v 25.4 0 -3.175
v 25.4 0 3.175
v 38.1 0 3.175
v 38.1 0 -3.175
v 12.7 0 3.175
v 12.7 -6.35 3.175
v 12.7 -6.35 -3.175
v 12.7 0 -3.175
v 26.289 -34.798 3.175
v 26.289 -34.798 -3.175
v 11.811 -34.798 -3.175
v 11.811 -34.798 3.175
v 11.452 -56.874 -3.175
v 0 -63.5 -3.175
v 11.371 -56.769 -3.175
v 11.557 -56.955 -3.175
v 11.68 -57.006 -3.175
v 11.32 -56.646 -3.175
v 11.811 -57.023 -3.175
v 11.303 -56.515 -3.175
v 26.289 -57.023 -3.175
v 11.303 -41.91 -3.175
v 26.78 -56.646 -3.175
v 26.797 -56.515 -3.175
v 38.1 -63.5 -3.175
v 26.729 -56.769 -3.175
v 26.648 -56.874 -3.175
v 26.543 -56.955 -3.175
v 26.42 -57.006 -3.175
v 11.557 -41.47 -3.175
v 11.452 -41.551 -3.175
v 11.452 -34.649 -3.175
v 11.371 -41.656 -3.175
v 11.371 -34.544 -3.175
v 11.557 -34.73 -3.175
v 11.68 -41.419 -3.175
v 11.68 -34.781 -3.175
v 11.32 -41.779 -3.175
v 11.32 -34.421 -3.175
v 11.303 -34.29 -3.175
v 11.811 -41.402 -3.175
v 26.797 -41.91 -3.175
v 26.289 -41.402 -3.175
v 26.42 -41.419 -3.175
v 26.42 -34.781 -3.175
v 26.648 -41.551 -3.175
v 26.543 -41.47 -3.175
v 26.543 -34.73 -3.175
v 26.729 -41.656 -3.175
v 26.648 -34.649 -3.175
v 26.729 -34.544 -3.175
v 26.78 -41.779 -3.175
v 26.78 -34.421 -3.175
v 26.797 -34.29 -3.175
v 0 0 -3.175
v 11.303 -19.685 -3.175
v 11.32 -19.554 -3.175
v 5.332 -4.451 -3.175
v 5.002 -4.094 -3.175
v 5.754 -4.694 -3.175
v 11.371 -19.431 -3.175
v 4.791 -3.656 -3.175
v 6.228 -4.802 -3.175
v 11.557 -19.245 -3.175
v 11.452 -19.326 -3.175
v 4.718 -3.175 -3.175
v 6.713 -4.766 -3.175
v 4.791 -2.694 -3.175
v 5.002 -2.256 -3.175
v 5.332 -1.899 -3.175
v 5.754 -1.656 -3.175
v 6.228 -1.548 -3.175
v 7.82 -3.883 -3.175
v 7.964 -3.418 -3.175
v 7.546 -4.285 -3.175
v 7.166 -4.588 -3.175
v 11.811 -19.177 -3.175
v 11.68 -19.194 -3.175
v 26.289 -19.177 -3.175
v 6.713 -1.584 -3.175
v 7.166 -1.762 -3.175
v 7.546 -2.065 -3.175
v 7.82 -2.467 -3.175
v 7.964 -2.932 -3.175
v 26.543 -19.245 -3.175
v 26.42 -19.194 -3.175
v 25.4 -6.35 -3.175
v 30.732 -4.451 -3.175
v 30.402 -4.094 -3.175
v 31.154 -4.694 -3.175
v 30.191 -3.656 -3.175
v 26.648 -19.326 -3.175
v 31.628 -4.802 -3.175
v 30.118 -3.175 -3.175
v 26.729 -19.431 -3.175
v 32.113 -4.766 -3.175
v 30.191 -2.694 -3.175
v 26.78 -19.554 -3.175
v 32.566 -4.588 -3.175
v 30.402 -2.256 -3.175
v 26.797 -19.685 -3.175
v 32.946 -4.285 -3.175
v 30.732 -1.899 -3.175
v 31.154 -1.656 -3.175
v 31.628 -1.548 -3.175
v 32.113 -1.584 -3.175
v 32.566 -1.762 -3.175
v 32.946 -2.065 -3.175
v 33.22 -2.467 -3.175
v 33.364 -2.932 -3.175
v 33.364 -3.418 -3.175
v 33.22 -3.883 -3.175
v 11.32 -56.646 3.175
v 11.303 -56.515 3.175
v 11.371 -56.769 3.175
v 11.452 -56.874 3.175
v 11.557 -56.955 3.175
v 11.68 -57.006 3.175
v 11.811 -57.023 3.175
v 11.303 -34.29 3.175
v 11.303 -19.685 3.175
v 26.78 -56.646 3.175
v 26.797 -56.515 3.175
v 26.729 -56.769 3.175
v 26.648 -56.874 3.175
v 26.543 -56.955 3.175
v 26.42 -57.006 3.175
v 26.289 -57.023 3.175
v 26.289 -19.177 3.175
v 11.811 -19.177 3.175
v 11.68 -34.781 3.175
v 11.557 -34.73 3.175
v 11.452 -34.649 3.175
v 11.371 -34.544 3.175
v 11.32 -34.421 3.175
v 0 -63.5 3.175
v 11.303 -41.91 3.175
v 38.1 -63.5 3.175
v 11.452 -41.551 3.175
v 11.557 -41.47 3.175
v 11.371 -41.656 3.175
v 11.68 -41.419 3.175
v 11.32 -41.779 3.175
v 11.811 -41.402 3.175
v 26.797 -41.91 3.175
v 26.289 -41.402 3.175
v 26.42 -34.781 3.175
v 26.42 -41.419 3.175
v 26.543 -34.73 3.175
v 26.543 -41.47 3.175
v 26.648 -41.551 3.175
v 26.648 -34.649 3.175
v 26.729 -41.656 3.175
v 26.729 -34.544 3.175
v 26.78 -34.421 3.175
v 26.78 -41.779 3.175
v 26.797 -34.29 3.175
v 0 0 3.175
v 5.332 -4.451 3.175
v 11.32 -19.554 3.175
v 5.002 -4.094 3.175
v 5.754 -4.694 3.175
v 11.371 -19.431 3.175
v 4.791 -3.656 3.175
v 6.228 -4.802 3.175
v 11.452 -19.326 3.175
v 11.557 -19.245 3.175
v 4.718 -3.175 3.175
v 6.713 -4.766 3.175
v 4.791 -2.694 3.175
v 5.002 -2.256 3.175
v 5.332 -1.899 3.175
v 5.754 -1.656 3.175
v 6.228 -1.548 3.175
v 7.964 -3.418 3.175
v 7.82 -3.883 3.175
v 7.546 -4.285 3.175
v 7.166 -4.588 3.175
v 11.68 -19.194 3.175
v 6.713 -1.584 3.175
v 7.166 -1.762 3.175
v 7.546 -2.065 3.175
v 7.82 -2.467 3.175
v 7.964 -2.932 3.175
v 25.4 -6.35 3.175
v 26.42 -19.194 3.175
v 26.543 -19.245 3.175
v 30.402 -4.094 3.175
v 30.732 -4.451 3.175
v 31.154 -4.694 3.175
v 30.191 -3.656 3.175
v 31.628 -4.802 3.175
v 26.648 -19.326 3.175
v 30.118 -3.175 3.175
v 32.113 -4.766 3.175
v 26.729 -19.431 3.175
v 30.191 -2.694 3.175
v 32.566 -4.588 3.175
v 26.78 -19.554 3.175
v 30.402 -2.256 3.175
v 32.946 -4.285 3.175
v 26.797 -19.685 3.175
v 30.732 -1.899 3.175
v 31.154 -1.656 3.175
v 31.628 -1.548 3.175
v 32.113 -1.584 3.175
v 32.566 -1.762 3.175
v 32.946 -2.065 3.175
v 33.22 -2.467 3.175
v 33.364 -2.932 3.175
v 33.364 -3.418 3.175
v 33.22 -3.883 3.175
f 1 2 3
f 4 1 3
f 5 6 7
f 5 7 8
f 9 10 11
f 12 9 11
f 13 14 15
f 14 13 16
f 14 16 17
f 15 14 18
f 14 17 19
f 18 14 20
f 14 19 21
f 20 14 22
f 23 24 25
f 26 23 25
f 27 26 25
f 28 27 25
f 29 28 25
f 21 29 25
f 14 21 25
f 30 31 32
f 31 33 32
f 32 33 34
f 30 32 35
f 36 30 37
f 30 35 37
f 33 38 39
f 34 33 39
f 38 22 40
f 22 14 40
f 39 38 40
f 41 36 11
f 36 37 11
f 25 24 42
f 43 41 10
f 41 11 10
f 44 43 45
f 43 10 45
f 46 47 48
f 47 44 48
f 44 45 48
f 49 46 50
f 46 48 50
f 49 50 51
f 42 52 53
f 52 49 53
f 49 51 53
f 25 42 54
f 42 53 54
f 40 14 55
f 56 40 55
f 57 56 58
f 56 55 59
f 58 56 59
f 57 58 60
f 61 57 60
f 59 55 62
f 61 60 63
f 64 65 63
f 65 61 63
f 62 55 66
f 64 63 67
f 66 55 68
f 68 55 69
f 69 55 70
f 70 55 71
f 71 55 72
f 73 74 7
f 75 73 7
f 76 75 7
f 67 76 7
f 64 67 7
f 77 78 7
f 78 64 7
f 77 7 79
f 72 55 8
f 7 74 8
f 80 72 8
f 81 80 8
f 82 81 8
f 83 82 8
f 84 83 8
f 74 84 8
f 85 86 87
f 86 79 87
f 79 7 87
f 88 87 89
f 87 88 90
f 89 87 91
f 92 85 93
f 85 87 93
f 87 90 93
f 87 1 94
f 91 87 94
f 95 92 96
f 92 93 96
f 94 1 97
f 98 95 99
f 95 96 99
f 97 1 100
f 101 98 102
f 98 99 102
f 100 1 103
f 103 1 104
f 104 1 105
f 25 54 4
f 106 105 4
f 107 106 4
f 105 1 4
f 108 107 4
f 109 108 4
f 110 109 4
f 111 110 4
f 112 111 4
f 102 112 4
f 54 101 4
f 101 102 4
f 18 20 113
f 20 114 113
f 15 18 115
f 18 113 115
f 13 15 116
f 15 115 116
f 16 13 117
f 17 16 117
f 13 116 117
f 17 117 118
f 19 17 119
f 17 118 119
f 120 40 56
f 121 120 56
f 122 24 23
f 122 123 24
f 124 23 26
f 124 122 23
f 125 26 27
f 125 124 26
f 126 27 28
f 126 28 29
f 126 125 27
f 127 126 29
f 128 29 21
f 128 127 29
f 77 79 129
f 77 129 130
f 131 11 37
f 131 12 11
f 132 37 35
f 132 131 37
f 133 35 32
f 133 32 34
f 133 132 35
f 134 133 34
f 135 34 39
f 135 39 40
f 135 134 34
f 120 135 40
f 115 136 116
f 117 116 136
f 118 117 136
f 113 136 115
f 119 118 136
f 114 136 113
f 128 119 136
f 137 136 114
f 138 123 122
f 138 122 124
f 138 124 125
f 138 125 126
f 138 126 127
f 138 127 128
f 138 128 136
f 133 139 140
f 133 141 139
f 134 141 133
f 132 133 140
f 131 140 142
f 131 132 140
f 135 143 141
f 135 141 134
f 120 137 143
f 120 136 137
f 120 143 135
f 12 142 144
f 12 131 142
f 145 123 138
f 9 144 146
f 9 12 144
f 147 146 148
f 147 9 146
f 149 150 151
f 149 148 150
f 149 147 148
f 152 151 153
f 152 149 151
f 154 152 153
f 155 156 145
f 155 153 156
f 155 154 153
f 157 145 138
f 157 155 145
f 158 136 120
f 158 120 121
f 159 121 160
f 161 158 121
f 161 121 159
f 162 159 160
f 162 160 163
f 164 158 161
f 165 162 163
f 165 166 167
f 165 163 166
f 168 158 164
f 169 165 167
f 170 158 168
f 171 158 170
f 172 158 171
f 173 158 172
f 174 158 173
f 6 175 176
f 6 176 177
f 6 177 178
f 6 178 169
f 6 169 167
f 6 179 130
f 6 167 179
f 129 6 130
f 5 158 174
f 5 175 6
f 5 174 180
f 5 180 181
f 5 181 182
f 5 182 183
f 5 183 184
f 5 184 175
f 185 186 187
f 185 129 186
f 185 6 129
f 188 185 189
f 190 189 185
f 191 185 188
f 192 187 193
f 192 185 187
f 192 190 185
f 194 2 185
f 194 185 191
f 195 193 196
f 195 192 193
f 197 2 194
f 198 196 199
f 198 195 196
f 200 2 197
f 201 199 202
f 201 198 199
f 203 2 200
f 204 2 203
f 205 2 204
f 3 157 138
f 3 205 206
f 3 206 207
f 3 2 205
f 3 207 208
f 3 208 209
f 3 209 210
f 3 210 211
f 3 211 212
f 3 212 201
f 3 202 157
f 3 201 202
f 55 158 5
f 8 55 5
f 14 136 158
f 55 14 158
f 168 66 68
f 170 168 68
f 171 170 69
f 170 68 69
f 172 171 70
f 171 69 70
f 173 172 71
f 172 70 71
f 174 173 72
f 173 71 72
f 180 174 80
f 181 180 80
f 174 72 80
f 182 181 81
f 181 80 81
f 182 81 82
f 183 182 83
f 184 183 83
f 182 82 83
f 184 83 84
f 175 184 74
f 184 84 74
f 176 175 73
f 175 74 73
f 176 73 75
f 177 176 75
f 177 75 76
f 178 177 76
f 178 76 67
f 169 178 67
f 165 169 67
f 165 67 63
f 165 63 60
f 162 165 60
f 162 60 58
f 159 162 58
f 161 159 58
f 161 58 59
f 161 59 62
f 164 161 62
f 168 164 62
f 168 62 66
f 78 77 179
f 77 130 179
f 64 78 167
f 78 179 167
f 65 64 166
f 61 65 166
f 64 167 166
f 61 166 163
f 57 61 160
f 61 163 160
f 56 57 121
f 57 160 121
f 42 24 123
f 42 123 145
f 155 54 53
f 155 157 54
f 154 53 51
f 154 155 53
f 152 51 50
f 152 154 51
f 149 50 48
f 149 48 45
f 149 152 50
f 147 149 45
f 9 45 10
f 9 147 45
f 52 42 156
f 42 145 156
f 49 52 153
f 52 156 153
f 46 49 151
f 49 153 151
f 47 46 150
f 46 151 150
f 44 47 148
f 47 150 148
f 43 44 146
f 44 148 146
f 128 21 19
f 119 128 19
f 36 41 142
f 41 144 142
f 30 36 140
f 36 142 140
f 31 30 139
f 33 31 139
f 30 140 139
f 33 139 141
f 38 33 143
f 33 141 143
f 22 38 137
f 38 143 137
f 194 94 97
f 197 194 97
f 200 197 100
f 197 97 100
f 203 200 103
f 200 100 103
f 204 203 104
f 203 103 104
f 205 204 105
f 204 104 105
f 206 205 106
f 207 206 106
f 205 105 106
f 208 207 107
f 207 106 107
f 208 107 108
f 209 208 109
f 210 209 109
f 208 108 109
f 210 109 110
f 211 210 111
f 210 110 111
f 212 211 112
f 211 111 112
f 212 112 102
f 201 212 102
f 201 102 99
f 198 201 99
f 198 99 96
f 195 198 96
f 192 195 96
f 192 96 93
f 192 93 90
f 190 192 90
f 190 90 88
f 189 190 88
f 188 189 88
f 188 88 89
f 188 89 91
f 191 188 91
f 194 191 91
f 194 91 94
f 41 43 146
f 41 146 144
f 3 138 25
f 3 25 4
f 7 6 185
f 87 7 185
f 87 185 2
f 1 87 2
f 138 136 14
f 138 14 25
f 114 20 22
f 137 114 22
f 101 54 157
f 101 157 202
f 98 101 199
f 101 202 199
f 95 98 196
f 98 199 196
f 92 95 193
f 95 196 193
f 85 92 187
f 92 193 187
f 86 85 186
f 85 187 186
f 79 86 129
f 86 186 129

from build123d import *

# Parameters (mm, degrees)
SKETCH1_W             = 38.1
SKETCH1_H             = 63.5
BOSS_EXTRUDE1_DEPTH   = 3.175
F_4_CLEARANCE_HOLE1_D = 3.2639
CUT_EXTRUDE3_REACH    = 76.325
SKETCH6_W             = 12.7
SKETCH6_H             = 6.35
CUT_EXTRUDE4_REACH    = 76.325
SKETCH10_W            = 15.494
SKETCH10_H            = 15.621
LPATTERN1_COUNT       = 2
LPATTERN1_PITCH       = 22.225
FILLET1_R             = 0.508


with BuildPart() as part:
    # Sketch1 → Boss-Extrude1 (new, symmetric)
    with BuildSketch(Plane.XY):
        with Locations((19.05, -31.75)):
            Rectangle(SKETCH1_W, SKETCH1_H)
    extrude(amount=BOSS_EXTRUDE1_DEPTH, both=True)

    # #4 Clearance Hole1 (through all)
    with Locations(Plane.XY.offset(3.175)):
        with Locations((6.35, -3.175), (31.75, -3.175)):
            Hole(F_4_CLEARANCE_HOLE1_D / 2)

    # Sketch6 → Cut-Extrude3 (cut, up to next)
    with BuildSketch(Plane.XY.offset(3.175), mode=Mode.PRIVATE) as cut_extrude3_sk1:
        with Locations((19.05, -3.175)):
            Rectangle(SKETCH6_W, SKETCH6_H)
    cut_extrude3_tool1 = extrude(cut_extrude3_sk1.sketch, amount=-CUT_EXTRUDE3_REACH, mode=Mode.PRIVATE) & part.part
    add(cut_extrude3_tool1.solids().sort_by_distance((19.05, -3.175, 3.175))[0], mode=Mode.SUBTRACT)

    # Sketch10 → Cut-Extrude4 (cut, up to next)
    with BuildSketch(Plane(origin=(0, 0, -3.175), x_dir=(-1, 0, 0), z_dir=(0, 0, -1)), mode=Mode.PRIVATE) as cut_extrude4_sk1:
        with Locations((-19.05, -26.9875)):
            Rectangle(SKETCH10_W, SKETCH10_H)
    cut_extrude4_tool1 = extrude(cut_extrude4_sk1.sketch, amount=-CUT_EXTRUDE4_REACH, mode=Mode.PRIVATE) & part.part
    cut_extrude4 = cut_extrude4_tool1.solids().sort_by_distance((19.05, -26.9875, -3.175))[0]
    add(cut_extrude4, mode=Mode.SUBTRACT)

    # LPattern1: Cut-Extrude4 ×2
    with Locations(*[(0, -i * LPATTERN1_PITCH, 0) for i in range(1, LPATTERN1_COUNT)]):
        add(cut_extrude4, mode=Mode.SUBTRACT)

    # Fillet1
    fillet1_edges = [part.edges().sort_by_distance(p)[0] for p in [
        (11.303, -19.177, 0),
        (11.303, -34.798, 0),
        (26.797, -34.798, 0),
        (26.797, -19.177, 0),
        (11.303, -41.402, 0),
        (11.303, -57.023, 0),
        (26.797, -57.023, 0),
        (26.797, -41.402, 0),
    ]]
    fillet(fillet1_edges, radius=FILLET1_R)


solid = part.part
